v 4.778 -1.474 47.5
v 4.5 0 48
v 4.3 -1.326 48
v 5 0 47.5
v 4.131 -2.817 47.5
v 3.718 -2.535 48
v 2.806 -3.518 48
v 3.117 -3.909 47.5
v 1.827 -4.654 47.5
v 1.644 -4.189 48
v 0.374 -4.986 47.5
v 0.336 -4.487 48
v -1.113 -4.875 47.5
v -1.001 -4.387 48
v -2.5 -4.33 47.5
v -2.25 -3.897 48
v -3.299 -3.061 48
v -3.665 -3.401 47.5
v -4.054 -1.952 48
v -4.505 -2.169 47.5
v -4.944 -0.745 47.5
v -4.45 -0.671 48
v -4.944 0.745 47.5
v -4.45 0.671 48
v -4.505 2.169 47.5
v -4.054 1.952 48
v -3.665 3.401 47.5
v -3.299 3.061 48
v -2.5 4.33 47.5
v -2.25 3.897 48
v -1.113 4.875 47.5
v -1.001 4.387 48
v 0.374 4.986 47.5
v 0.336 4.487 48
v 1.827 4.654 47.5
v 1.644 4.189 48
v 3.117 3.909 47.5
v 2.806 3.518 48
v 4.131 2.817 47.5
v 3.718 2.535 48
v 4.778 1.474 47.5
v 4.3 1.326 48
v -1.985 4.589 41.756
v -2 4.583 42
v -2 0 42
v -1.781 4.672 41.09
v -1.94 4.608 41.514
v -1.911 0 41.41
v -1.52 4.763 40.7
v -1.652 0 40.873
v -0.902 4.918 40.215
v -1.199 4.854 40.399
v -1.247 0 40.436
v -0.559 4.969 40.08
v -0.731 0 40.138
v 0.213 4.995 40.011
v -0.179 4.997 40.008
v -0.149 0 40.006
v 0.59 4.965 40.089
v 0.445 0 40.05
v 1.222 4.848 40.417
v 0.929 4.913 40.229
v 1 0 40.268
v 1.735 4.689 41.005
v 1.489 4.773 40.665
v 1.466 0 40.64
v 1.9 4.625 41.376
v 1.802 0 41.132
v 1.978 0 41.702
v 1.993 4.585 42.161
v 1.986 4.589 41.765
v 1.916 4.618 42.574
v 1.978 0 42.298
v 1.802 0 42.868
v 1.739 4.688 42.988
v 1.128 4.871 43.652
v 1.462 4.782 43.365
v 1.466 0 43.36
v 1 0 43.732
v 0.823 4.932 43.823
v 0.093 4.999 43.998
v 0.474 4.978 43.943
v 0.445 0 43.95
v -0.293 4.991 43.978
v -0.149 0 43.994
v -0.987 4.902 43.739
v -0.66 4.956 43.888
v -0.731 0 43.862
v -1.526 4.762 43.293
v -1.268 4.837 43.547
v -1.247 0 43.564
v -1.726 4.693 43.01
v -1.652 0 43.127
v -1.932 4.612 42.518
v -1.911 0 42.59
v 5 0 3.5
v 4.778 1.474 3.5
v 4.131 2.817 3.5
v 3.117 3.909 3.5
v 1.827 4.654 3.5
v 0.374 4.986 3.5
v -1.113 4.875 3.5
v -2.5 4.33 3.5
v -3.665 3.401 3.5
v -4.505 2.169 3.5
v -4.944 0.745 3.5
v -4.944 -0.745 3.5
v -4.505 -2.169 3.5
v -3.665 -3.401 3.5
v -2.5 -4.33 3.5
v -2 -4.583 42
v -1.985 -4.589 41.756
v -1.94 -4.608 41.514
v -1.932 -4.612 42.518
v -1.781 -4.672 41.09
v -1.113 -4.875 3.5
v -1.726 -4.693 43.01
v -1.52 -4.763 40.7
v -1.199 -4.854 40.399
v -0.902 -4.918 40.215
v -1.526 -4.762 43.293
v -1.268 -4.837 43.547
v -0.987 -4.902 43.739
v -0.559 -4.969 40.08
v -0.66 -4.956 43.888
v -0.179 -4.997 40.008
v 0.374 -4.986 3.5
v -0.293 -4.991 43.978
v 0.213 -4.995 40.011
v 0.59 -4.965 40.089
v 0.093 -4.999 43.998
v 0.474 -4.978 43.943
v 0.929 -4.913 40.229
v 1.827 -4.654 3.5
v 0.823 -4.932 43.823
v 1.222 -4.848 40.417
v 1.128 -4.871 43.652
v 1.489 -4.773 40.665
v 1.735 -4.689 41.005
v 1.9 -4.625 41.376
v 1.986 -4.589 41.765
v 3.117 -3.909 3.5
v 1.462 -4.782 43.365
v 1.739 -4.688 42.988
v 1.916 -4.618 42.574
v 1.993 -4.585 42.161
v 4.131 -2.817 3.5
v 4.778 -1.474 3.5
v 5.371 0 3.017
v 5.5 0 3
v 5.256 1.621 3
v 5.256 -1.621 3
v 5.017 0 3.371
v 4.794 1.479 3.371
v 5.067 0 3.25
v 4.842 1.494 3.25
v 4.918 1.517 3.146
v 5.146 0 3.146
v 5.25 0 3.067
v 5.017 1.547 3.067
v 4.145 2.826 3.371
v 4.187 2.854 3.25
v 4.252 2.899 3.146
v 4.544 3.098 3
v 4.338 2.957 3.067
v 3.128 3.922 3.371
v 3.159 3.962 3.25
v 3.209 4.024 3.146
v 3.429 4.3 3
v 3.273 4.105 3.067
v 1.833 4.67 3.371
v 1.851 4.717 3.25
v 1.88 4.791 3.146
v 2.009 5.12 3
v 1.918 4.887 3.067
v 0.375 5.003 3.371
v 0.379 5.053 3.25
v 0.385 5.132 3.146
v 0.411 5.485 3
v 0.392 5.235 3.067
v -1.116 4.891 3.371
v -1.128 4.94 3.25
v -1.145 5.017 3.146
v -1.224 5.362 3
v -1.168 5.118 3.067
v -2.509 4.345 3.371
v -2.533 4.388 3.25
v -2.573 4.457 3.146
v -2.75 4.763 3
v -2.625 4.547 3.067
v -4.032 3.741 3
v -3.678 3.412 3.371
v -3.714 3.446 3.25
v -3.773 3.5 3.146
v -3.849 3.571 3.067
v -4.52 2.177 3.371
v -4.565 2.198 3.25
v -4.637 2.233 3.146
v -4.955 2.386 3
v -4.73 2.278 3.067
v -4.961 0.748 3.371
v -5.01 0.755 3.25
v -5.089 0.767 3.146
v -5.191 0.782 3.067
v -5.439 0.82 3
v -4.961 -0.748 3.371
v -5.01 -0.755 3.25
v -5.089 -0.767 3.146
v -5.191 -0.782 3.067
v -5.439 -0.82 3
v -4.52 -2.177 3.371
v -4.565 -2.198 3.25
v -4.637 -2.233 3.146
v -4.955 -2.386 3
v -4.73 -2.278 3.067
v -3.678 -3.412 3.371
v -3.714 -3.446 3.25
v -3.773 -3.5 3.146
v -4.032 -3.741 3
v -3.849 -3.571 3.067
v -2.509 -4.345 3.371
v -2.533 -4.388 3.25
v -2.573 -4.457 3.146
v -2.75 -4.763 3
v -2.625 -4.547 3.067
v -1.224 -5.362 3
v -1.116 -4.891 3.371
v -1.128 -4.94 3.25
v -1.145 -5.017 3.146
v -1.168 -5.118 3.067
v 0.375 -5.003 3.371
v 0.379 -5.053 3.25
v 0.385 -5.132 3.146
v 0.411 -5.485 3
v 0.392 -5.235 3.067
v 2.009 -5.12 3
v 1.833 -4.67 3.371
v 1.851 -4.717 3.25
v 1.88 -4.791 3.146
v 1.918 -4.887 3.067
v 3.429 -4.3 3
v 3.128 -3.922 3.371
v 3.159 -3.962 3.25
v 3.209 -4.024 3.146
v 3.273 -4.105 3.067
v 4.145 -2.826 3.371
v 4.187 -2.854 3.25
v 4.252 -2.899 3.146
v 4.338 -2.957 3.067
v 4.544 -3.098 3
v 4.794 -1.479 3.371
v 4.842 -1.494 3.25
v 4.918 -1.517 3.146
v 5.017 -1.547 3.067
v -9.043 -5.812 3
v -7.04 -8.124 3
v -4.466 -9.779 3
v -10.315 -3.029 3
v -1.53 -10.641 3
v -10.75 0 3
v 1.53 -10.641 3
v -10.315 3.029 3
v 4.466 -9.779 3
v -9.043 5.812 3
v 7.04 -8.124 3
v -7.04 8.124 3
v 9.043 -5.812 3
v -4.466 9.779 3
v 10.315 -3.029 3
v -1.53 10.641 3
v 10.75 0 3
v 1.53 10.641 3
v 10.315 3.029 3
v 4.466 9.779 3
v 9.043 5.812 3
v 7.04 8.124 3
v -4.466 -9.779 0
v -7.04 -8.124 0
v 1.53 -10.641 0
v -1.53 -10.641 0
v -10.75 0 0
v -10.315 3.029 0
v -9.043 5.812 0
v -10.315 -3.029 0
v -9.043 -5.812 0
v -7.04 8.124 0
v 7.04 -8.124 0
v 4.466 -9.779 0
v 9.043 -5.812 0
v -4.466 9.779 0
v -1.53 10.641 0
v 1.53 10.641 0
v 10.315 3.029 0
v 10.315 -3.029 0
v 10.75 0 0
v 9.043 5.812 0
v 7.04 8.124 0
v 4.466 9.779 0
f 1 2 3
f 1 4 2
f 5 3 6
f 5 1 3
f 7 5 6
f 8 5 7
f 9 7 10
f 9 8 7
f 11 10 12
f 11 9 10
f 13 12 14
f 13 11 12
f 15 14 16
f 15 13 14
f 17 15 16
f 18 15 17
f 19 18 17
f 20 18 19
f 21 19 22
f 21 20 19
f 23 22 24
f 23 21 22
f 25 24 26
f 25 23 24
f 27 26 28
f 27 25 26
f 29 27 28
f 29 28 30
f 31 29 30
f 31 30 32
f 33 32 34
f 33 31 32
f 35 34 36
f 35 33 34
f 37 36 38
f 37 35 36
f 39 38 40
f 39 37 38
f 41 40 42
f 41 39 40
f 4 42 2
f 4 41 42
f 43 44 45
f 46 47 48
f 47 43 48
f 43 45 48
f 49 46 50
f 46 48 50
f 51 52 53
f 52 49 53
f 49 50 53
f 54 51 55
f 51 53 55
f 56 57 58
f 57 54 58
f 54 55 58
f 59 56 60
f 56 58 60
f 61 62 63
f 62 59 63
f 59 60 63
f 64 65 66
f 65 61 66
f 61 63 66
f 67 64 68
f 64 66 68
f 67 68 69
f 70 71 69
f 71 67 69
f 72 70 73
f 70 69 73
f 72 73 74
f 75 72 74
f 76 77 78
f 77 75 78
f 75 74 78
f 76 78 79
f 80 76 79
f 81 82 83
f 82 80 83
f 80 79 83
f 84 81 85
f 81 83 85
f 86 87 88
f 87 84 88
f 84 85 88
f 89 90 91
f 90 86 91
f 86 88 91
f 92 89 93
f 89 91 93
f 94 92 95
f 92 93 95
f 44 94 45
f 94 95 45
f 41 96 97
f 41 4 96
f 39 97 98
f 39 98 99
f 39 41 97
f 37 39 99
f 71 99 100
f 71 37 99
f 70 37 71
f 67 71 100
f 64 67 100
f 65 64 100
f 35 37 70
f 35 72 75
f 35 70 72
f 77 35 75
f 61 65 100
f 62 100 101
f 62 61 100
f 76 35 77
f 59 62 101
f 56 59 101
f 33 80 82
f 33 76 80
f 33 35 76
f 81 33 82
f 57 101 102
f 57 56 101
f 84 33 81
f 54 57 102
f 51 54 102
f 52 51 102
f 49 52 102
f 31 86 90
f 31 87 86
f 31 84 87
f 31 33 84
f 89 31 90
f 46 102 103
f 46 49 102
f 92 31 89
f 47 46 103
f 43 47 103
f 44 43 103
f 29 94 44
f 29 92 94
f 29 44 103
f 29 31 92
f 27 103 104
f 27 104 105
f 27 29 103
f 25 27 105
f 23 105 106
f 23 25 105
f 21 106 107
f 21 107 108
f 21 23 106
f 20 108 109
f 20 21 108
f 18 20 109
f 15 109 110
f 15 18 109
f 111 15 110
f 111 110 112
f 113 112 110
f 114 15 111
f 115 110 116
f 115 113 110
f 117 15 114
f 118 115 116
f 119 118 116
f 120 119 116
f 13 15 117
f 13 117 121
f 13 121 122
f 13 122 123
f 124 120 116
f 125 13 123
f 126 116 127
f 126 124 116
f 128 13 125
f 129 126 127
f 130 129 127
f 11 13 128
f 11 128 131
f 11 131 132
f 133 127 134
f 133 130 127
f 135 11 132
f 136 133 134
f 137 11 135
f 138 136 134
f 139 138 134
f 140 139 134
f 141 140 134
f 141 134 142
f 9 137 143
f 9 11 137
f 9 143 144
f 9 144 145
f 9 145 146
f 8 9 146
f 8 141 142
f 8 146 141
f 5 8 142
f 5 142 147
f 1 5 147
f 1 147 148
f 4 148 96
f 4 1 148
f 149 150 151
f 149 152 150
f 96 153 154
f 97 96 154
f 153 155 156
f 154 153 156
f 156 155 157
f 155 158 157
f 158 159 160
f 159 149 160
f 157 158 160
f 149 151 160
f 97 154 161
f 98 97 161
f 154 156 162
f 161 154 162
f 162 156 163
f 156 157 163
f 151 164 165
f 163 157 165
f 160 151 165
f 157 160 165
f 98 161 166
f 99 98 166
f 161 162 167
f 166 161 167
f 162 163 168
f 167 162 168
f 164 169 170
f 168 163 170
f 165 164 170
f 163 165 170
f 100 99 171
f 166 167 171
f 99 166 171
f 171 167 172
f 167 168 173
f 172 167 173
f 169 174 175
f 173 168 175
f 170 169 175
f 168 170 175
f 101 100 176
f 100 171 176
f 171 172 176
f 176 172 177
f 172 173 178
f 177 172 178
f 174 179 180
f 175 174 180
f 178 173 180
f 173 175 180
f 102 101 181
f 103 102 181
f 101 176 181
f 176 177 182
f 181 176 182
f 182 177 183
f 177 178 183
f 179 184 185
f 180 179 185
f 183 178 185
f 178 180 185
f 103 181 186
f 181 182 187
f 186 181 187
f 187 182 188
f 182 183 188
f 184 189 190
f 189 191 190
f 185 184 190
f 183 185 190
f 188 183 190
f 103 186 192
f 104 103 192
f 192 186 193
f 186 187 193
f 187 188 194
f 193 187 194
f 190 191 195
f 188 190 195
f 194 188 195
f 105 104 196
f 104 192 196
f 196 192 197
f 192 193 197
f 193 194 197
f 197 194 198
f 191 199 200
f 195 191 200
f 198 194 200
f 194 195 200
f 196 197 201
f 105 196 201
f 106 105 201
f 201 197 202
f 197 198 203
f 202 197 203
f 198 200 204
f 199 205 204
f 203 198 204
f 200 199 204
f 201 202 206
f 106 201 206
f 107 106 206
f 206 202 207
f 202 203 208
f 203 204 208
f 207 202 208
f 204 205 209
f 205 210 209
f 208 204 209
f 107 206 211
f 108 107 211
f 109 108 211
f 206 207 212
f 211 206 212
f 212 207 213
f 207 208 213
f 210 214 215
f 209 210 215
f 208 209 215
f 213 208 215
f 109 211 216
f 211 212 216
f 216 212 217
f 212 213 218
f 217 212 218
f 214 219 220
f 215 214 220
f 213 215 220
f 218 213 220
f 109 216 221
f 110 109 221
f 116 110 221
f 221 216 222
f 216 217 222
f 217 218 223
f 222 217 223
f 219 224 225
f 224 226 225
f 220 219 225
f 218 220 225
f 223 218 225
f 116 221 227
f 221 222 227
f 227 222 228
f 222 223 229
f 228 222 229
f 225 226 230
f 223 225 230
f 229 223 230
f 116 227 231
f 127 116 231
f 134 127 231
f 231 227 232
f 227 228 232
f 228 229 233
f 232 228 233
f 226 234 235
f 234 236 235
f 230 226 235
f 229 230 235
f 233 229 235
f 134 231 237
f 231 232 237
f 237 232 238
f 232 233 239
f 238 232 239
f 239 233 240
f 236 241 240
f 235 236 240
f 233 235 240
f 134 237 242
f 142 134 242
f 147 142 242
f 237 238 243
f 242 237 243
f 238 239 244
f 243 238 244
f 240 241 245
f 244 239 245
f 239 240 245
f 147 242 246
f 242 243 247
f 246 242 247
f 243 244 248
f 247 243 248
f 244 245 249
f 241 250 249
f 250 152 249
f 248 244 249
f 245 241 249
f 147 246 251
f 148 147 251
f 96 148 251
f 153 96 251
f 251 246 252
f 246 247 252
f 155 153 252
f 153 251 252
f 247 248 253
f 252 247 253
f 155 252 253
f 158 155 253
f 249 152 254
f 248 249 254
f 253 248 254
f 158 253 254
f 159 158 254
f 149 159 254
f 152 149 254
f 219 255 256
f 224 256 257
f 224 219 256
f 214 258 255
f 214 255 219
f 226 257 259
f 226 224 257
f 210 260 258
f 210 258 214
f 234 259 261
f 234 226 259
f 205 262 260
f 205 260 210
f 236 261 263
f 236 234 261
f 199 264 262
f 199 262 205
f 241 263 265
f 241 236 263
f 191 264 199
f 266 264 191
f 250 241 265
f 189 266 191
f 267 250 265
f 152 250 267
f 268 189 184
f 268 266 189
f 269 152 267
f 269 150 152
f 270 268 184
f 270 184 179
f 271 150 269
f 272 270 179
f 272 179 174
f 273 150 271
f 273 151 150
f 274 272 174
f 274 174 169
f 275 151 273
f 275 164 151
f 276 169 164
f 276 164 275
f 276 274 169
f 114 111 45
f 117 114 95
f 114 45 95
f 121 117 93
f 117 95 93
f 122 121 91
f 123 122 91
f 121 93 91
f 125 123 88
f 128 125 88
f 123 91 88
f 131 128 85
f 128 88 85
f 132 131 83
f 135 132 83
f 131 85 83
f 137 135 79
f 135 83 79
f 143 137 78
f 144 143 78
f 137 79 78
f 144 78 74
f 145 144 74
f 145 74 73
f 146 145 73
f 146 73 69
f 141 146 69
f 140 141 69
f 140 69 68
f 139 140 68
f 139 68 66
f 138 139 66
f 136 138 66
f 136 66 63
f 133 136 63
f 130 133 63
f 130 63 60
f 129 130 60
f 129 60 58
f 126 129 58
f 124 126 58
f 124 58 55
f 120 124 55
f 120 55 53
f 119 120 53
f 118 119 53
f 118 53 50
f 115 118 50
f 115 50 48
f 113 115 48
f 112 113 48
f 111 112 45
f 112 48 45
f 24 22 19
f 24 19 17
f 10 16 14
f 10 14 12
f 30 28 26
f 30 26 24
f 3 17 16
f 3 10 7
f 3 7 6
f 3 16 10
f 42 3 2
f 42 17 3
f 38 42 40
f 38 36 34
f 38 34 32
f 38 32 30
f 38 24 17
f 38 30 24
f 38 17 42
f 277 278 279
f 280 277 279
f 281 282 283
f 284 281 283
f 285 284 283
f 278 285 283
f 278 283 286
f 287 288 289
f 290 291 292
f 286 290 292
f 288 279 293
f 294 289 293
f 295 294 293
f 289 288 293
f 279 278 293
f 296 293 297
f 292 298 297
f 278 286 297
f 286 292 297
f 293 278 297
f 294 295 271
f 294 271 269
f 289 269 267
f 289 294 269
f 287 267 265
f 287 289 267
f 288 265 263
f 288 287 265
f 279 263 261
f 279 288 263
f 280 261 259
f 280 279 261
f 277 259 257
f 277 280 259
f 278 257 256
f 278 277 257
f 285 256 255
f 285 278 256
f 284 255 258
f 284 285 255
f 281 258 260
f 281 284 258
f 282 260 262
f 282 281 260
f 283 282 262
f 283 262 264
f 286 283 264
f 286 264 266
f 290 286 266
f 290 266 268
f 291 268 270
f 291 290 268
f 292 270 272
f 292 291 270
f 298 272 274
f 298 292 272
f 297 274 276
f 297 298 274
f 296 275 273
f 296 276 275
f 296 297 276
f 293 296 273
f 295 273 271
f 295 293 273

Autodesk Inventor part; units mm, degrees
ref_plane "YZ Plane" through (0, 0, 0) normal (1, 0, 0) x (0, 1, 0)
ref_plane "XZ Plane" through (0, 0, 0) normal (0, 1, 0) x (-1, 0, 0)
ref_plane "XY Plane" through (0, 0, 0) normal (0, 0, 1) x (1, 0, 0)
sketch "Sketch1" plane through (0, 0, 0) normal (0, 0, 1) x (1, 0, 0)
  circle A0 centre (0, 0) radius 10.75
  dimension "d0" = 21.5
extrude "Extrusion1" add sketch "Sketch1" along normal blind 48
sketch "Sketch2" plane through (0, 0, 48) normal (0, 0, 1) x (1, 0, 0)
  circle A0 centre (0, 0) radius 10.75 projected
  circle A1 centre (0, 0) radius 5
  dimension "d3" = 10
extrude "Extrusion2" cut sketch "Sketch2" against normal blind 45
chamfer "Chamfer1" distance 0.5 angle 45 1 edges at (-5, 0, 48)
fillet "Fillet1" radius 0.5 1 edges at (-5, 0, 3)
sketch "Sketch3" plane through (0, 0, 0) normal (0, 1, 0) x (-1, 0, 0)
  line L0 (-4.5, 48) -> (4.5, 48) projected
  line L1 (5, 47.5) -> (-5, 47.5) projected
  line L2 (-5, 3.5) -> (5, 3.5) projected
  circle A0 centre (0, 42) radius 2
  point P0 (0, 0)
  dimension "d10" = 4
  dimension "d11" = 6
extrude "Extrusion3" cut sketch "Sketch3" along normal mid plane 15
properties part number "EIXO DAS ENGRENAGENS(11)" material "Carbon Steel"
